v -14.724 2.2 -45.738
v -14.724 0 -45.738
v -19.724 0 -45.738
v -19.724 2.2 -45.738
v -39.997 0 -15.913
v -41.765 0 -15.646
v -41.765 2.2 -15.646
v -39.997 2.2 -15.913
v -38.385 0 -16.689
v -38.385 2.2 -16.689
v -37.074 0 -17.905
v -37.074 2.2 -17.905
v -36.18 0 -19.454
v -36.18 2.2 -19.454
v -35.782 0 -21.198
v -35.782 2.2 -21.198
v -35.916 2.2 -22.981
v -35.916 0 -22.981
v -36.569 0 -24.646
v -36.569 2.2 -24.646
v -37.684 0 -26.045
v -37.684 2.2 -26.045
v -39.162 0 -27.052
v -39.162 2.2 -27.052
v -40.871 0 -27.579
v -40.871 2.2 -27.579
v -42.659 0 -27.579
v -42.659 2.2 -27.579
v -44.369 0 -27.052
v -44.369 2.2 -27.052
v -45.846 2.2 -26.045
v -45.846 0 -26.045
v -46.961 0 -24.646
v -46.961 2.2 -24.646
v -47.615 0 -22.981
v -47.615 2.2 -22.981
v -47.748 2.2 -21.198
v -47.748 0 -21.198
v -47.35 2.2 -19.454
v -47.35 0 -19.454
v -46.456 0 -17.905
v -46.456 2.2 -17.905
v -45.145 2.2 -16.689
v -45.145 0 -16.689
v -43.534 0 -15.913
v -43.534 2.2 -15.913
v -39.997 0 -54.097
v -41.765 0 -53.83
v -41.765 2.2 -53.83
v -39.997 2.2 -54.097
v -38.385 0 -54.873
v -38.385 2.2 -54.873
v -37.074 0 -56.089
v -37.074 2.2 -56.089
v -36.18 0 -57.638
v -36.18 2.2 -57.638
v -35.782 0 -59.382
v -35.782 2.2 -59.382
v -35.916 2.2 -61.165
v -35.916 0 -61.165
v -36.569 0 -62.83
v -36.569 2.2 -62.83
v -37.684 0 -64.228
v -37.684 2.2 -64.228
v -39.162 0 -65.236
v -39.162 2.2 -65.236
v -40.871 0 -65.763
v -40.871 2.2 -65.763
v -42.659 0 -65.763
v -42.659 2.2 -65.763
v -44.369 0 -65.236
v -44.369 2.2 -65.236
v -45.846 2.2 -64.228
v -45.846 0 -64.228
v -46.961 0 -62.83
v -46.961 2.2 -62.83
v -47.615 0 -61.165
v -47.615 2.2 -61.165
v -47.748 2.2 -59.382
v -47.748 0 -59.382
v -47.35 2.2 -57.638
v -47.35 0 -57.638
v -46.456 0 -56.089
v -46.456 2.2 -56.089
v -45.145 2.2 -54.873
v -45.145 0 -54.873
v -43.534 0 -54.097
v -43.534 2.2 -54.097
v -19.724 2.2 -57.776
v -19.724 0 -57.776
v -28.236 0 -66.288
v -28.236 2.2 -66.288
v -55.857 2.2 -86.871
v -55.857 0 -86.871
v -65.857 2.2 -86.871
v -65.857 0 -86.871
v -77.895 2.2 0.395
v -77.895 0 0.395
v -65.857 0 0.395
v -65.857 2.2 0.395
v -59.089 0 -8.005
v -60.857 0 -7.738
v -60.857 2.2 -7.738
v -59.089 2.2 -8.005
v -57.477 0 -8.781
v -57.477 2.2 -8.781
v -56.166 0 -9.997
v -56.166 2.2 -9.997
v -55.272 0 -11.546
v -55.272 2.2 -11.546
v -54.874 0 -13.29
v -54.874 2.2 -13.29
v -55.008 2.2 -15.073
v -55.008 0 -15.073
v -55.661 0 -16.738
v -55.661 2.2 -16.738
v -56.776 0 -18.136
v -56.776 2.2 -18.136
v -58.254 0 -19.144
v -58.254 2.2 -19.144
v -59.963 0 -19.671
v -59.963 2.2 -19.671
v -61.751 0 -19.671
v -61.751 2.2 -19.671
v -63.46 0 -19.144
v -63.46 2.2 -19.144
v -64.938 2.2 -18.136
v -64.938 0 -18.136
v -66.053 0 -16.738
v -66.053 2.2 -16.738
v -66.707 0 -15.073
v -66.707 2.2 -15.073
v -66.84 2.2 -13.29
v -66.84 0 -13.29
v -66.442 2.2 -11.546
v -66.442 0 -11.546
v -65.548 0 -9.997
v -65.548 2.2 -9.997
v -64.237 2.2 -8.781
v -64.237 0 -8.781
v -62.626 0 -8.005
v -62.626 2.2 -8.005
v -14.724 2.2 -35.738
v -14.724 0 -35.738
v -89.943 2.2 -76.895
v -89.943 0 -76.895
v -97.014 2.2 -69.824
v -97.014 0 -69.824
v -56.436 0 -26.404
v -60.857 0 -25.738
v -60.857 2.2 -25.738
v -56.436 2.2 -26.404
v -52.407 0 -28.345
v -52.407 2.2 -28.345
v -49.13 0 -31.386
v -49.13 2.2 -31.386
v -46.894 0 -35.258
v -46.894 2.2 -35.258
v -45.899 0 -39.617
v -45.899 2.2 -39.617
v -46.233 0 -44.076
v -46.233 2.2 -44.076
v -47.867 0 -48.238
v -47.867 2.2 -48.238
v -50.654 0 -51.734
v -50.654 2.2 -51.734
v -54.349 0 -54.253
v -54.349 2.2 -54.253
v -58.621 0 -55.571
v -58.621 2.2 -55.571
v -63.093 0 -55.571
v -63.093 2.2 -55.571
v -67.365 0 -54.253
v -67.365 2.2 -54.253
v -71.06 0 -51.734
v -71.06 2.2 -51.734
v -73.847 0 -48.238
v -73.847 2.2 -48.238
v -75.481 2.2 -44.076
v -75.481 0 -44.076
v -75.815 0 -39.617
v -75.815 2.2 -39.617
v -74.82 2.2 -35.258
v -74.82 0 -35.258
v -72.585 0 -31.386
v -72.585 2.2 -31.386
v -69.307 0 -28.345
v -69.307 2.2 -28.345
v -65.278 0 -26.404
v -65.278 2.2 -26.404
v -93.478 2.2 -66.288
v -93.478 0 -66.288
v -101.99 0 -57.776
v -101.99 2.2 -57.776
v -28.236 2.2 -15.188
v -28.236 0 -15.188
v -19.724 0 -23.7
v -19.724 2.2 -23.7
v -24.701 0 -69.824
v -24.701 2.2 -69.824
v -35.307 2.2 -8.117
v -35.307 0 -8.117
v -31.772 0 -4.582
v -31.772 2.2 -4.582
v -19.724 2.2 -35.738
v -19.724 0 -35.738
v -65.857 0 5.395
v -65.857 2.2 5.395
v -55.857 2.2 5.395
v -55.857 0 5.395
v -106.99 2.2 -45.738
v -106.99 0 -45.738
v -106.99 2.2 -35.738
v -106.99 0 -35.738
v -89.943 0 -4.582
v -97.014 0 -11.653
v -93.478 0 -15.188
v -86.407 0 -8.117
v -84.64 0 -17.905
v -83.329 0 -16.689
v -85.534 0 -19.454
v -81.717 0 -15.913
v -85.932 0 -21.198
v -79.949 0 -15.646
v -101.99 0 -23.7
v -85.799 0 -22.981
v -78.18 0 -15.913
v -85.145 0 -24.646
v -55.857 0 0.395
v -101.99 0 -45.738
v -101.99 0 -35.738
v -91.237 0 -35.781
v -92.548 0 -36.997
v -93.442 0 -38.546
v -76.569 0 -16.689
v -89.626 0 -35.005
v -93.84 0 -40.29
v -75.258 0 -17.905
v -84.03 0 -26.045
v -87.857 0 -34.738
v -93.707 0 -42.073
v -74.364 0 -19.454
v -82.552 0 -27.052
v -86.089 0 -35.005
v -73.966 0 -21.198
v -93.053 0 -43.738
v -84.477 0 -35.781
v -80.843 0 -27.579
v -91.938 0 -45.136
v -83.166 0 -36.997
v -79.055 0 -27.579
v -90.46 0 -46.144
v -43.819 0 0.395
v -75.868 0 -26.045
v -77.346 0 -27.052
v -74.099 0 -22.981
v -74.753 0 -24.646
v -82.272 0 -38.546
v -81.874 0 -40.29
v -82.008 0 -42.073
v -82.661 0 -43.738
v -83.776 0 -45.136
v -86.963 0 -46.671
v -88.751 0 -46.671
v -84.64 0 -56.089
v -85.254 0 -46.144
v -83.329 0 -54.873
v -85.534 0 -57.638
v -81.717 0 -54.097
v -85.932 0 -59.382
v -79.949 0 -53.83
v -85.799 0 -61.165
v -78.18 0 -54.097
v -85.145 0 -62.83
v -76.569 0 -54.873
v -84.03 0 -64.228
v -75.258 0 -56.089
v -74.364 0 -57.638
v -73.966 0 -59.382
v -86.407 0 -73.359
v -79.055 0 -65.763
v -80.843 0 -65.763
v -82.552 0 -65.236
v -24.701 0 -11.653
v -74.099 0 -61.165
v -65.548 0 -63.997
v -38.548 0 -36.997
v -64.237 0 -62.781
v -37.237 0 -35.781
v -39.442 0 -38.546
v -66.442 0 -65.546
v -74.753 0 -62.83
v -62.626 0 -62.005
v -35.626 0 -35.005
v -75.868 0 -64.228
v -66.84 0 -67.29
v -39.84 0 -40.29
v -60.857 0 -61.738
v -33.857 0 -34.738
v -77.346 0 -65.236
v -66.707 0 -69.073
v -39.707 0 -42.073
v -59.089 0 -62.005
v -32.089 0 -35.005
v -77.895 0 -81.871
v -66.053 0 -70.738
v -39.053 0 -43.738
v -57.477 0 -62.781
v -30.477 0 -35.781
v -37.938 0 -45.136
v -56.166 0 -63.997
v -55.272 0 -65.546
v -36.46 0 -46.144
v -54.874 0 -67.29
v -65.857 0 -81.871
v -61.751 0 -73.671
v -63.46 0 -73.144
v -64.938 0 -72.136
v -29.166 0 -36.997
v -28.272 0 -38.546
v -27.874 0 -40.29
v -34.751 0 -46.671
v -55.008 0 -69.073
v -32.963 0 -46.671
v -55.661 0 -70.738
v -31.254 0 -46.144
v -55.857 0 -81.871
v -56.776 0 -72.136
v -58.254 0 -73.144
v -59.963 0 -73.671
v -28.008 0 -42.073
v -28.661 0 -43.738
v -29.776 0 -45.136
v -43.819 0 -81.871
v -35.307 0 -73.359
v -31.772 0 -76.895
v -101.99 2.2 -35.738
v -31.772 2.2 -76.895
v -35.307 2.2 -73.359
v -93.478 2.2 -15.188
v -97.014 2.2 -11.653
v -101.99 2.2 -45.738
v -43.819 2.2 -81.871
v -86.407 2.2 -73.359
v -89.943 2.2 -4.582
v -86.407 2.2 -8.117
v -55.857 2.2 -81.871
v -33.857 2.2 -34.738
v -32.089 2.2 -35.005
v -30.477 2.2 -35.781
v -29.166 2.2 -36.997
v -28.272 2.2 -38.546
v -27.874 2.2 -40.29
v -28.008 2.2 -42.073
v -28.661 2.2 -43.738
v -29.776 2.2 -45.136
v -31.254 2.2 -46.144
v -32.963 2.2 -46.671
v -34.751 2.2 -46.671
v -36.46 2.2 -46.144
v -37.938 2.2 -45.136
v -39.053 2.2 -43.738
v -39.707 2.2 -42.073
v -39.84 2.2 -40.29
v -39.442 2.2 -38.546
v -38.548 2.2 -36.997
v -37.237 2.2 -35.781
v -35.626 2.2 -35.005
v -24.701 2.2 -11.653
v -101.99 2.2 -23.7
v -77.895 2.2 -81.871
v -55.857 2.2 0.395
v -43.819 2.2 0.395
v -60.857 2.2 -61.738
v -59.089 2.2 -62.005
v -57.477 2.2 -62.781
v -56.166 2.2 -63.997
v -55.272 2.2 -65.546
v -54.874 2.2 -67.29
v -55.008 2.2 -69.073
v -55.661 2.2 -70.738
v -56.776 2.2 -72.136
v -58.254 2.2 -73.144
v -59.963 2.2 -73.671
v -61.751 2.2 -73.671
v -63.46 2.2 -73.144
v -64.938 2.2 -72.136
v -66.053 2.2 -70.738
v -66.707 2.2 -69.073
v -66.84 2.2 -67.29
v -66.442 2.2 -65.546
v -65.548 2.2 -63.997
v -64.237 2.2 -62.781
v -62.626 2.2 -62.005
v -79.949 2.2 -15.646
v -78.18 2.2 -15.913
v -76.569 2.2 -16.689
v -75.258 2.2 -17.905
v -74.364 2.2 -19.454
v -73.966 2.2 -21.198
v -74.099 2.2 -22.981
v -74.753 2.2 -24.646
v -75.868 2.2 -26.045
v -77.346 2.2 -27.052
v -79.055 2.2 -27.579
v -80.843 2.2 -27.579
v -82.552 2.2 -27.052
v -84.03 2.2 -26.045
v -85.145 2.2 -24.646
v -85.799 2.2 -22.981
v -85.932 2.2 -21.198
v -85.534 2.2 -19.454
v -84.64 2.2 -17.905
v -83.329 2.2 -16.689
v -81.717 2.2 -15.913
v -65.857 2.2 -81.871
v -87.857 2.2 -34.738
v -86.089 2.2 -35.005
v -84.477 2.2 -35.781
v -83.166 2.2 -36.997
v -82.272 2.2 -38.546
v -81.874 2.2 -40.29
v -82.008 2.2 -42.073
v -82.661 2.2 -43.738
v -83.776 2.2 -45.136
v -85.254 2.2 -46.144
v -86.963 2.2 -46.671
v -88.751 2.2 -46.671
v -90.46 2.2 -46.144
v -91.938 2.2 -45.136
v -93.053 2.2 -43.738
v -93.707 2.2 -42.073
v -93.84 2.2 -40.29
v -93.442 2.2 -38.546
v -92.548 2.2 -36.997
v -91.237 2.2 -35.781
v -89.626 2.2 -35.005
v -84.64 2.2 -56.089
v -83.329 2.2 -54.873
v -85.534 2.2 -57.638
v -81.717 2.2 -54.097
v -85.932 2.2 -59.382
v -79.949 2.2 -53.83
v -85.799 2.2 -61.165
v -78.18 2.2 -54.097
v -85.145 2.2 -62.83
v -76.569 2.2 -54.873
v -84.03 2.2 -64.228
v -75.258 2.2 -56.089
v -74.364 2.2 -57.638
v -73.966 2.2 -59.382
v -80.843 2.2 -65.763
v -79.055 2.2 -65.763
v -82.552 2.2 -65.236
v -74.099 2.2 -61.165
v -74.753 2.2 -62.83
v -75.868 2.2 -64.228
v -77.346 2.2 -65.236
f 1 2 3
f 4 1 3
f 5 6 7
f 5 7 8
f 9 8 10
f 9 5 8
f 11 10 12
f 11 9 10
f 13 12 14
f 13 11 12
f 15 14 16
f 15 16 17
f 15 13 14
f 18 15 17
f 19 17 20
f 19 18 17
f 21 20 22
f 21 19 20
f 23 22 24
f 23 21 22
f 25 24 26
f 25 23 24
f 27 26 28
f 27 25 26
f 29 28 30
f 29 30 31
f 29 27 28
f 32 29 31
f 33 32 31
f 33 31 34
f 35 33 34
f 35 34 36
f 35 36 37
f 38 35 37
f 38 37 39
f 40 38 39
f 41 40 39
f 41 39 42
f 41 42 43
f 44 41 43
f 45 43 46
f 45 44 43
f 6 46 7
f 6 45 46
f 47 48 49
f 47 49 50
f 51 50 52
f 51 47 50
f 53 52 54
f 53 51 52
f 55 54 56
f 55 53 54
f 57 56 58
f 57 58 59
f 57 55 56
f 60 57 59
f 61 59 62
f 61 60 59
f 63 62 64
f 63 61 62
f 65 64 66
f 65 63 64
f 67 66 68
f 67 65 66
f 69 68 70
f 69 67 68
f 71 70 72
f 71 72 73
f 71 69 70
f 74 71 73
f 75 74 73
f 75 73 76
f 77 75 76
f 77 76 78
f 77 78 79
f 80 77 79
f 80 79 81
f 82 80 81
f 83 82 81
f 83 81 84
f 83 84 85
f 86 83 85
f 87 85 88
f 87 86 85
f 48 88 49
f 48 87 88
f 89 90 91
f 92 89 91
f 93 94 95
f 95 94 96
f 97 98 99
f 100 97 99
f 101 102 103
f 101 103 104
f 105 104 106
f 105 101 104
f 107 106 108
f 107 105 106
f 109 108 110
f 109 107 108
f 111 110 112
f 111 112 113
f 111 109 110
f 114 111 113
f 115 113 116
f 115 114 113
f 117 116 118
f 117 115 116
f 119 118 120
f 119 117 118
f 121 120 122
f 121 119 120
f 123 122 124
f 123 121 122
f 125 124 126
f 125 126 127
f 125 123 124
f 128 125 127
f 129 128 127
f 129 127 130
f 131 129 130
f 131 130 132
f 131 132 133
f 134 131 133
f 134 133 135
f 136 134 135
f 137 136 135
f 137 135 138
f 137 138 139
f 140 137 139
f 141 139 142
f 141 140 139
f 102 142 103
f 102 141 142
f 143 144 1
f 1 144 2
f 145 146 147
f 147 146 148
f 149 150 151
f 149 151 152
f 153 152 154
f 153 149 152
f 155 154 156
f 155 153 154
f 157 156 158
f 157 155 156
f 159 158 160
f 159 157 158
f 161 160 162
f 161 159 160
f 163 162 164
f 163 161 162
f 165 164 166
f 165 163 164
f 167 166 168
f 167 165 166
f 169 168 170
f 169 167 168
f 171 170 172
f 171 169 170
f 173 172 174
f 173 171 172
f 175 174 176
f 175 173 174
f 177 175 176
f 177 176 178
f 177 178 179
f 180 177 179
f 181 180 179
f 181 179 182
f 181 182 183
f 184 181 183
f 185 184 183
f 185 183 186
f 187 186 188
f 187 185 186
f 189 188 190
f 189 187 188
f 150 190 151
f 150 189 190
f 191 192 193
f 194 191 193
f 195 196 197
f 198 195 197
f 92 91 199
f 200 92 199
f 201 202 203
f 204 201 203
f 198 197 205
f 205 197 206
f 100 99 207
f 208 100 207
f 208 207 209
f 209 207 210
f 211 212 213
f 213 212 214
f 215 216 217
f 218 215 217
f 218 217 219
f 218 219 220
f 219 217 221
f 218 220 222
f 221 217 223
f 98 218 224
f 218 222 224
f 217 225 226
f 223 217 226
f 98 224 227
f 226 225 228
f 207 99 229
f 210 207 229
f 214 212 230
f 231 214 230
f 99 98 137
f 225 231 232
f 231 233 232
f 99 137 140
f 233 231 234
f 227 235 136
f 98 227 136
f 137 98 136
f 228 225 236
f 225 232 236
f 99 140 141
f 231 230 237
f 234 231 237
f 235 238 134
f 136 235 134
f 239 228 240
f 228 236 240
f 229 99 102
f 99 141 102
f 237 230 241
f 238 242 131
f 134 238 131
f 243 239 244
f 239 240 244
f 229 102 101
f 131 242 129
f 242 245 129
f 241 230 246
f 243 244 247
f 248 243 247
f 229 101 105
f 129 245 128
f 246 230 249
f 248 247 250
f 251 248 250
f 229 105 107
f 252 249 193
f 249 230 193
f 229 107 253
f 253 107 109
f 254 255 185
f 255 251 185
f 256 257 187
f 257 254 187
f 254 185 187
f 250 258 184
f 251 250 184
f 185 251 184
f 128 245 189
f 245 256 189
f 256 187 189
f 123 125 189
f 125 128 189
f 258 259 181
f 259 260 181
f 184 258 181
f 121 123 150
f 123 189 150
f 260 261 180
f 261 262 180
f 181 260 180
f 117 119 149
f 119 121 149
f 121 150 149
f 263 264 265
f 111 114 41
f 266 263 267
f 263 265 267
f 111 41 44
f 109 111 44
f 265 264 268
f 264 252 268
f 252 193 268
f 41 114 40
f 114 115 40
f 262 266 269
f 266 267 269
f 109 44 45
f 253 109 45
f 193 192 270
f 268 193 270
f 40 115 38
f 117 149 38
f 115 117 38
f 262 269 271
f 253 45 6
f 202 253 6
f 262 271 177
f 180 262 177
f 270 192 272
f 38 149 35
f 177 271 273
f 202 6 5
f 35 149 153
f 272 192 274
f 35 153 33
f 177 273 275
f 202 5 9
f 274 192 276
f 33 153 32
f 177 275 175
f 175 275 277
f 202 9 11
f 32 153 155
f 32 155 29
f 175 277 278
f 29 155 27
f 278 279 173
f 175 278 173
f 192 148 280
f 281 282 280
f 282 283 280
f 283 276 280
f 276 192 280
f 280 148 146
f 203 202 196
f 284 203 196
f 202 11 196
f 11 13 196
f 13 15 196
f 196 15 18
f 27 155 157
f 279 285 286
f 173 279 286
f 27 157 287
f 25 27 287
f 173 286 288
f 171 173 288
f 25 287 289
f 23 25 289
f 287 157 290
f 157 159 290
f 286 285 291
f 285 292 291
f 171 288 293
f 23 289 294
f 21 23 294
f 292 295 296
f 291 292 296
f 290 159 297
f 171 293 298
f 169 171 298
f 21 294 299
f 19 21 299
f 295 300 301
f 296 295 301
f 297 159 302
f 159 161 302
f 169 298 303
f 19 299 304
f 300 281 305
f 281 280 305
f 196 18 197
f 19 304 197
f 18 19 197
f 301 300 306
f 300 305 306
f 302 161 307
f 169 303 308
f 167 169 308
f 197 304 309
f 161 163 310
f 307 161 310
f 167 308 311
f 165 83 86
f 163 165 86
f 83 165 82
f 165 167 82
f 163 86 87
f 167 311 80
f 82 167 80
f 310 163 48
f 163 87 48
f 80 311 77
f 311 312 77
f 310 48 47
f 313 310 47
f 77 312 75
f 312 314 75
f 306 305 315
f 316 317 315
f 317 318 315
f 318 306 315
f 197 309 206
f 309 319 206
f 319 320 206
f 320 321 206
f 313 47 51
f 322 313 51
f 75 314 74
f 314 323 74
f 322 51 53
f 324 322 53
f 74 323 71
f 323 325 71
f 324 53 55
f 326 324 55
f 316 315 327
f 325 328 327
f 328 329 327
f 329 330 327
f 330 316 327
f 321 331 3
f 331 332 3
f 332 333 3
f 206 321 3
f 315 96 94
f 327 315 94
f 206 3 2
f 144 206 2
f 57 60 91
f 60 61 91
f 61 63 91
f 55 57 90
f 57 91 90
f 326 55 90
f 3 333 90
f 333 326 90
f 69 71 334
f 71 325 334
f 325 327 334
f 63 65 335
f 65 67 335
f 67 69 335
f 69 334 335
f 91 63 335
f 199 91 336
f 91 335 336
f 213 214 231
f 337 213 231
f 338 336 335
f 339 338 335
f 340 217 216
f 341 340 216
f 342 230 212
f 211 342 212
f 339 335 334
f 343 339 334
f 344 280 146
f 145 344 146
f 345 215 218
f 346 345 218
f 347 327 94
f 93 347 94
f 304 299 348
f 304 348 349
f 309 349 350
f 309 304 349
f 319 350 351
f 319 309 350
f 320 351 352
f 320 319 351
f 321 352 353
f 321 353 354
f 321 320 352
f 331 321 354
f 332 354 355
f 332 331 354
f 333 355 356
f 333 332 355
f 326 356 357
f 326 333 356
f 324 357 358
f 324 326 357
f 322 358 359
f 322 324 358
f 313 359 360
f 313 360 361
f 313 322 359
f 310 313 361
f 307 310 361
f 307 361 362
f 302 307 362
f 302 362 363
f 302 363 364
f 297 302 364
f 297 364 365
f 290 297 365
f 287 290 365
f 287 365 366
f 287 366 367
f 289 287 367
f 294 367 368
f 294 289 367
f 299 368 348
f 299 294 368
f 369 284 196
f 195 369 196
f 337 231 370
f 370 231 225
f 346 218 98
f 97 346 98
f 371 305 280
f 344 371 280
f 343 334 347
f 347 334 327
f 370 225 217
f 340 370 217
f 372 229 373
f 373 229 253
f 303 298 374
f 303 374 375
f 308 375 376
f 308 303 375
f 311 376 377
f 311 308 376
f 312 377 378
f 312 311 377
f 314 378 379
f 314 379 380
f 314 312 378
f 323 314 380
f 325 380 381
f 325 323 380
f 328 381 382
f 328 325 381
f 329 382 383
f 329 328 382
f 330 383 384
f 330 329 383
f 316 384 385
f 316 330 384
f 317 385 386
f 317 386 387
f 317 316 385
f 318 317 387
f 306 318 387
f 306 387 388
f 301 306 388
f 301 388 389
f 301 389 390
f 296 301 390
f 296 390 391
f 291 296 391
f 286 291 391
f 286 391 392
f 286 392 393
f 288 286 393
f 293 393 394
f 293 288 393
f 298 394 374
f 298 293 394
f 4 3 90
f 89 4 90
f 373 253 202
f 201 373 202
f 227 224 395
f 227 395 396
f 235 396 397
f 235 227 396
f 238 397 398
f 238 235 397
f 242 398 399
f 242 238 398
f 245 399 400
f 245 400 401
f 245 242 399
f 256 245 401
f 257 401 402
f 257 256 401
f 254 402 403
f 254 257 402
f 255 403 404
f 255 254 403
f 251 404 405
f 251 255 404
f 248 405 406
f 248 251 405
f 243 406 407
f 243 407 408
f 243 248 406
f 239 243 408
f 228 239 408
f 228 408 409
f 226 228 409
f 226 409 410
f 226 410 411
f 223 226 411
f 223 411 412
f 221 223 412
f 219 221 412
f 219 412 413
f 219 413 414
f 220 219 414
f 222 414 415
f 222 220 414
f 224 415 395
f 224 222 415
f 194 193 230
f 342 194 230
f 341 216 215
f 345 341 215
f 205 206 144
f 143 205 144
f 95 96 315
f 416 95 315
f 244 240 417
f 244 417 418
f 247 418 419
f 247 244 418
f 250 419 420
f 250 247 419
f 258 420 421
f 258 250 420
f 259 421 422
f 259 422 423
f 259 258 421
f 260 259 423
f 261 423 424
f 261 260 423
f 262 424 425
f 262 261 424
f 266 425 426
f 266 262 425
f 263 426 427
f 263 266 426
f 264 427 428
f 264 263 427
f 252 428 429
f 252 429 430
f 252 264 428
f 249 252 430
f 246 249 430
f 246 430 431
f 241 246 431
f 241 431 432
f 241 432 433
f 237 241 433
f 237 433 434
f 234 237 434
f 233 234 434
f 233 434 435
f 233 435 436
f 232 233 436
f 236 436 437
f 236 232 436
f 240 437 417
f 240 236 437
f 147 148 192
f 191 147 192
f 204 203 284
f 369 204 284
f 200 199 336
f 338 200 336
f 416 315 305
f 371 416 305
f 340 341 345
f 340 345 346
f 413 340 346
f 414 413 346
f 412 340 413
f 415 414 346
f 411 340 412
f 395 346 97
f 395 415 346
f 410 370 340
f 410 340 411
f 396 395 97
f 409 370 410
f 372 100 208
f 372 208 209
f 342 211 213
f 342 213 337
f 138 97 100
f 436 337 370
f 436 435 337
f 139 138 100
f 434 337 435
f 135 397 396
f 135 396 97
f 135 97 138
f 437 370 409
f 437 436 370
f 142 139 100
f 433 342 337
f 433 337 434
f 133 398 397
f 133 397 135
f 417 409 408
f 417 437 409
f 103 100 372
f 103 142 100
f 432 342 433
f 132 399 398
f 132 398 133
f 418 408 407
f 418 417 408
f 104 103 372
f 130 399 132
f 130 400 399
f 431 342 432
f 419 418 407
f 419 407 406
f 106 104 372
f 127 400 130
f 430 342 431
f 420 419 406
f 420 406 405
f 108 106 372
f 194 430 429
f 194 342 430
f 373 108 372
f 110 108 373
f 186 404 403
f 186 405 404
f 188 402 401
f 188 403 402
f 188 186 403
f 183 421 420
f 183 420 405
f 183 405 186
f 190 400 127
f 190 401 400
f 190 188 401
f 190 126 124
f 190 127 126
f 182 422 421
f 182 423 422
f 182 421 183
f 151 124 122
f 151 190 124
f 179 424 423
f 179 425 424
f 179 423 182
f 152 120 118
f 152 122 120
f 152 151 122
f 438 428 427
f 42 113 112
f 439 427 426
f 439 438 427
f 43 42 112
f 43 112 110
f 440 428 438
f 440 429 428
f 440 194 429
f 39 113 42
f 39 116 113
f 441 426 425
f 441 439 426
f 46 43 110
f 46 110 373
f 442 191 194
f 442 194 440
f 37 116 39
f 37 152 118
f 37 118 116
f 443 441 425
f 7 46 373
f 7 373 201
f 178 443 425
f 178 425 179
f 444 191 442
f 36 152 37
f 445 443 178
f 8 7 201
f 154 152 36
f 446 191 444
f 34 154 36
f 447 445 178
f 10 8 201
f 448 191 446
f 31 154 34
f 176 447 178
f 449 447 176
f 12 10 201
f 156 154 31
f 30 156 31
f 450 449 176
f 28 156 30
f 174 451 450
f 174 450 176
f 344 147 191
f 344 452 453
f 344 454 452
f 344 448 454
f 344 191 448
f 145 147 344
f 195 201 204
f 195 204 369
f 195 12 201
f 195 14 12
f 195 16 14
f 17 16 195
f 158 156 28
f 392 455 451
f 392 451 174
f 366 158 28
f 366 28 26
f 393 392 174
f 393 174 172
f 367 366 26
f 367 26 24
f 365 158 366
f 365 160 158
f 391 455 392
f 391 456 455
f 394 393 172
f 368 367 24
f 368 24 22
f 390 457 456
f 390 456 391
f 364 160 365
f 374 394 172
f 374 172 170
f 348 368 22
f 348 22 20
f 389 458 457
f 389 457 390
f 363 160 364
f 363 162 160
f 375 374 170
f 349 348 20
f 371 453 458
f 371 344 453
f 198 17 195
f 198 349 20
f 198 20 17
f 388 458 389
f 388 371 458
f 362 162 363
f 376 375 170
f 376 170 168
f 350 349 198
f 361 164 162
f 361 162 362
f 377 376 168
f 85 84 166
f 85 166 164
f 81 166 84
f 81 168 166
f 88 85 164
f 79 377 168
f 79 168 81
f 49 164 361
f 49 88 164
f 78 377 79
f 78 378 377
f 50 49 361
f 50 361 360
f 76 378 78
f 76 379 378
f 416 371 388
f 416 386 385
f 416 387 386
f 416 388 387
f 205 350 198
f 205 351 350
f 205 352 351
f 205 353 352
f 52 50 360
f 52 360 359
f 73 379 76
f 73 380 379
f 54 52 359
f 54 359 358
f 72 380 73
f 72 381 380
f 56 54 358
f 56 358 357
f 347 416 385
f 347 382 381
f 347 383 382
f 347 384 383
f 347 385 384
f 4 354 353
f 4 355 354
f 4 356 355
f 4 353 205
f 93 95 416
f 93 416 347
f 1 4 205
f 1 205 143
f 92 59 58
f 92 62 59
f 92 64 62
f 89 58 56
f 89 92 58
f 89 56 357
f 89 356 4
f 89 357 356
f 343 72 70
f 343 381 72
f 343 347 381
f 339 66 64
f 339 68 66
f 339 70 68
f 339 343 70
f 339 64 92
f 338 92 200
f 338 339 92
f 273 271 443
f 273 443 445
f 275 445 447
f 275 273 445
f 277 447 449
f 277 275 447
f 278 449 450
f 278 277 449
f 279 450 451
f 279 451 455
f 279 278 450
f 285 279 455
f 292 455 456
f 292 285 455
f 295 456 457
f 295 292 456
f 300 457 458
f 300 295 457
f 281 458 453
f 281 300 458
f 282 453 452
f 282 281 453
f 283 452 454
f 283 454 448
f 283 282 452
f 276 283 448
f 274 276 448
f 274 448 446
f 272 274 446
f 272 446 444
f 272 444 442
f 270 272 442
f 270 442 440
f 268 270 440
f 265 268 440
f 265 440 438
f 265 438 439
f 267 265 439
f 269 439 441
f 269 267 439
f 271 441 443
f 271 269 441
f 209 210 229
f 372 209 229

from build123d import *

# Parameters (mm, degrees)
SKETCH1_R           = 6
SKETCH1_R_2         = 15
BOSS_EXTRUDE1_DEPTH = 2.2


with BuildPart() as part:
    # Sketch1 → Boss-Extrude1 (new body)
    with BuildSketch(Plane(origin=(0, 0, 0), x_dir=(1, 0, 0), z_dir=(0, 1, 0))):
        Polygon((-55.857081241, 81.871122291), (-55.857081241, 86.871122291), (-65.857081241, 86.871122291), (-65.857081241, 81.871122291), (-77.894941, 81.871122291), (-86.406993267, 73.359070024), (-89.942527173, 76.89460393), (-97.013594985, 69.823536118), (-93.478061079, 66.288002212), (-101.990113346, 57.775949945), (-101.990113346, 45.738090186), (-106.990113346, 45.738090186), (-106.990113346, 35.738090186), (-101.990113346, 35.738090186), (-101.990113346, 23.700230426), (-93.478061079, 15.188178159), (-97.013594985, 11.652644253), (-89.942527173, 4.581576441), (-86.406993267, 8.117110347), (-77.894941, -0.39494192), (-65.857081241, -0.39494192), (-65.857081241, -5.39494192), (-55.857081241, -5.39494192), (-55.857081241, -0.39494192), (-43.819221481, -0.39494192), (-35.307169214, 8.117110347), (-31.771635308, 4.581576441), (-24.700567496, 11.652644253), (-28.236101402, 15.188178159), (-19.724049135, 23.700230426), (-19.724049135, 35.738090186), (-14.724049135, 35.738090186), (-14.724049135, 45.738090186), (-19.724049135, 45.738090186), (-19.724049135, 57.775949945), (-28.236101402, 66.288002212), (-24.700567496, 69.823536118), (-31.771635308, 76.89460393), (-35.307169214, 73.359070024), (-43.819221481, 81.871122291), align=None)
        with Locations(Location((-60.857081241, 67.738090186, 0), (0, 0, 270))):
            Circle(SKETCH1_R, mode=Mode.SUBTRACT)
        with Locations(Location((-41.765198148, 59.829973278, 0), (0, 0, 270))):
            Circle(SKETCH1_R, mode=Mode.SUBTRACT)
        with Locations(Location((-33.857081241, 40.738090186, 0), (0, 0, 270))):
            Circle(SKETCH1_R, mode=Mode.SUBTRACT)
        with Locations(Location((-41.765198148, 21.646207094, 0), (0, 0, 270))):
            Circle(SKETCH1_R, mode=Mode.SUBTRACT)
        with Locations(Location((-60.857081241, 13.738090186, 0), (0, 0, 270))):
            Circle(SKETCH1_R, mode=Mode.SUBTRACT)
        with Locations(Location((-79.948964333, 21.646207094, 0), (0, 0, 270))):
            Circle(SKETCH1_R, mode=Mode.SUBTRACT)
        with Locations(Location((-87.857081241, 40.738090186, 0), (0, 0, 270))):
            Circle(SKETCH1_R, mode=Mode.SUBTRACT)
        with Locations(Location((-79.948964333, 59.829973278, 0), (0, 0, 270))):
            Circle(SKETCH1_R, mode=Mode.SUBTRACT)
        with Locations(Location((-60.857081241, 40.738090186, 0), (0, 0, 270))):
            Circle(SKETCH1_R_2, mode=Mode.SUBTRACT)
    extrude(amount=BOSS_EXTRUDE1_DEPTH)


solid = part.part
